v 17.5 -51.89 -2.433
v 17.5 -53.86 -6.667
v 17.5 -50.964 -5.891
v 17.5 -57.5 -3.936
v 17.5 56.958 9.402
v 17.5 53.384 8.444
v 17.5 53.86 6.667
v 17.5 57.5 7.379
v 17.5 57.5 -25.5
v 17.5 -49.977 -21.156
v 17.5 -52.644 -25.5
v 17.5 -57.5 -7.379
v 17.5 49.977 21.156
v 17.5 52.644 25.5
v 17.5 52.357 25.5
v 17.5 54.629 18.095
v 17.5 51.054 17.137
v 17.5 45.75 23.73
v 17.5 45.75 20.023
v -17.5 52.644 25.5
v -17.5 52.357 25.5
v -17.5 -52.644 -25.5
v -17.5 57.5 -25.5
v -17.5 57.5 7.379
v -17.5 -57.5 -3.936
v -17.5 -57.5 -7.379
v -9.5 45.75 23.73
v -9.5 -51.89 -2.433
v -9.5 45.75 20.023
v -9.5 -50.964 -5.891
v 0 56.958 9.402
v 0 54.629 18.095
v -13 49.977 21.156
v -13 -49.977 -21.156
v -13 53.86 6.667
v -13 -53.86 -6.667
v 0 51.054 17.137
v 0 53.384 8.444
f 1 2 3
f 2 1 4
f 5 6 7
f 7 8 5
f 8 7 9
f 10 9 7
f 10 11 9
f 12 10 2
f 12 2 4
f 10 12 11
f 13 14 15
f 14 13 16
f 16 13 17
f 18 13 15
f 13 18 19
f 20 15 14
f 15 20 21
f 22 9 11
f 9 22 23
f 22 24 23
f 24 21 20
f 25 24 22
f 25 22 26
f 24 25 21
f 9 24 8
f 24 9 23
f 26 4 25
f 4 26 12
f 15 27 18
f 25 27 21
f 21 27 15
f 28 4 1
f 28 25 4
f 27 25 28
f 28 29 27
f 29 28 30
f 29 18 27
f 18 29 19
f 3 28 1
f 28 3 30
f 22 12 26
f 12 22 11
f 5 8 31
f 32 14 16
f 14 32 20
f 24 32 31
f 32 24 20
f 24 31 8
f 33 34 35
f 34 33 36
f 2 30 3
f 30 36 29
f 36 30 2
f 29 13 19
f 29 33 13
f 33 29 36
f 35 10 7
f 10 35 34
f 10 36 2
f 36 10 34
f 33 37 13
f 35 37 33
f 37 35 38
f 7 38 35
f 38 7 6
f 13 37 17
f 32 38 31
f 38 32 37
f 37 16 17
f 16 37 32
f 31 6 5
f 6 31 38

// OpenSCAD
$fn=60;

// grouping for printing
difference() {
    // body
    translate([0, 0, 0])
    cube([35, 115, 51], true);

    // top cutoff
    translate([0, 0, 27])
    rotate([15,0,0])
    cube([37, 150, 30], true);

    // inner cutoff
    translate([8, -8, 17])
    cube([35, 107.5, 25], true);
    translate([8, -28, 5])
    rotate([15,0,0])
    cube([35, 50, 25], true);

    // front cutoff
    translate([0, -80, -20])
    rotate([15,0,0])
    cube([37, 50, 25], true);

    // back cutoff
    translate([0, 80, 20])
    rotate([15,0,0])
    cube([37, 50, 25], true);

    // keyboard cutoff
    translate([4.5, 0, 0])
    rotate([15,0,0])
    cube([35, 107.5, 15], true);

    // cable cutoff
    translate([9, 53, 13])
    rotate([15,0,0])
    cube([18, 10, 9], true);
}
